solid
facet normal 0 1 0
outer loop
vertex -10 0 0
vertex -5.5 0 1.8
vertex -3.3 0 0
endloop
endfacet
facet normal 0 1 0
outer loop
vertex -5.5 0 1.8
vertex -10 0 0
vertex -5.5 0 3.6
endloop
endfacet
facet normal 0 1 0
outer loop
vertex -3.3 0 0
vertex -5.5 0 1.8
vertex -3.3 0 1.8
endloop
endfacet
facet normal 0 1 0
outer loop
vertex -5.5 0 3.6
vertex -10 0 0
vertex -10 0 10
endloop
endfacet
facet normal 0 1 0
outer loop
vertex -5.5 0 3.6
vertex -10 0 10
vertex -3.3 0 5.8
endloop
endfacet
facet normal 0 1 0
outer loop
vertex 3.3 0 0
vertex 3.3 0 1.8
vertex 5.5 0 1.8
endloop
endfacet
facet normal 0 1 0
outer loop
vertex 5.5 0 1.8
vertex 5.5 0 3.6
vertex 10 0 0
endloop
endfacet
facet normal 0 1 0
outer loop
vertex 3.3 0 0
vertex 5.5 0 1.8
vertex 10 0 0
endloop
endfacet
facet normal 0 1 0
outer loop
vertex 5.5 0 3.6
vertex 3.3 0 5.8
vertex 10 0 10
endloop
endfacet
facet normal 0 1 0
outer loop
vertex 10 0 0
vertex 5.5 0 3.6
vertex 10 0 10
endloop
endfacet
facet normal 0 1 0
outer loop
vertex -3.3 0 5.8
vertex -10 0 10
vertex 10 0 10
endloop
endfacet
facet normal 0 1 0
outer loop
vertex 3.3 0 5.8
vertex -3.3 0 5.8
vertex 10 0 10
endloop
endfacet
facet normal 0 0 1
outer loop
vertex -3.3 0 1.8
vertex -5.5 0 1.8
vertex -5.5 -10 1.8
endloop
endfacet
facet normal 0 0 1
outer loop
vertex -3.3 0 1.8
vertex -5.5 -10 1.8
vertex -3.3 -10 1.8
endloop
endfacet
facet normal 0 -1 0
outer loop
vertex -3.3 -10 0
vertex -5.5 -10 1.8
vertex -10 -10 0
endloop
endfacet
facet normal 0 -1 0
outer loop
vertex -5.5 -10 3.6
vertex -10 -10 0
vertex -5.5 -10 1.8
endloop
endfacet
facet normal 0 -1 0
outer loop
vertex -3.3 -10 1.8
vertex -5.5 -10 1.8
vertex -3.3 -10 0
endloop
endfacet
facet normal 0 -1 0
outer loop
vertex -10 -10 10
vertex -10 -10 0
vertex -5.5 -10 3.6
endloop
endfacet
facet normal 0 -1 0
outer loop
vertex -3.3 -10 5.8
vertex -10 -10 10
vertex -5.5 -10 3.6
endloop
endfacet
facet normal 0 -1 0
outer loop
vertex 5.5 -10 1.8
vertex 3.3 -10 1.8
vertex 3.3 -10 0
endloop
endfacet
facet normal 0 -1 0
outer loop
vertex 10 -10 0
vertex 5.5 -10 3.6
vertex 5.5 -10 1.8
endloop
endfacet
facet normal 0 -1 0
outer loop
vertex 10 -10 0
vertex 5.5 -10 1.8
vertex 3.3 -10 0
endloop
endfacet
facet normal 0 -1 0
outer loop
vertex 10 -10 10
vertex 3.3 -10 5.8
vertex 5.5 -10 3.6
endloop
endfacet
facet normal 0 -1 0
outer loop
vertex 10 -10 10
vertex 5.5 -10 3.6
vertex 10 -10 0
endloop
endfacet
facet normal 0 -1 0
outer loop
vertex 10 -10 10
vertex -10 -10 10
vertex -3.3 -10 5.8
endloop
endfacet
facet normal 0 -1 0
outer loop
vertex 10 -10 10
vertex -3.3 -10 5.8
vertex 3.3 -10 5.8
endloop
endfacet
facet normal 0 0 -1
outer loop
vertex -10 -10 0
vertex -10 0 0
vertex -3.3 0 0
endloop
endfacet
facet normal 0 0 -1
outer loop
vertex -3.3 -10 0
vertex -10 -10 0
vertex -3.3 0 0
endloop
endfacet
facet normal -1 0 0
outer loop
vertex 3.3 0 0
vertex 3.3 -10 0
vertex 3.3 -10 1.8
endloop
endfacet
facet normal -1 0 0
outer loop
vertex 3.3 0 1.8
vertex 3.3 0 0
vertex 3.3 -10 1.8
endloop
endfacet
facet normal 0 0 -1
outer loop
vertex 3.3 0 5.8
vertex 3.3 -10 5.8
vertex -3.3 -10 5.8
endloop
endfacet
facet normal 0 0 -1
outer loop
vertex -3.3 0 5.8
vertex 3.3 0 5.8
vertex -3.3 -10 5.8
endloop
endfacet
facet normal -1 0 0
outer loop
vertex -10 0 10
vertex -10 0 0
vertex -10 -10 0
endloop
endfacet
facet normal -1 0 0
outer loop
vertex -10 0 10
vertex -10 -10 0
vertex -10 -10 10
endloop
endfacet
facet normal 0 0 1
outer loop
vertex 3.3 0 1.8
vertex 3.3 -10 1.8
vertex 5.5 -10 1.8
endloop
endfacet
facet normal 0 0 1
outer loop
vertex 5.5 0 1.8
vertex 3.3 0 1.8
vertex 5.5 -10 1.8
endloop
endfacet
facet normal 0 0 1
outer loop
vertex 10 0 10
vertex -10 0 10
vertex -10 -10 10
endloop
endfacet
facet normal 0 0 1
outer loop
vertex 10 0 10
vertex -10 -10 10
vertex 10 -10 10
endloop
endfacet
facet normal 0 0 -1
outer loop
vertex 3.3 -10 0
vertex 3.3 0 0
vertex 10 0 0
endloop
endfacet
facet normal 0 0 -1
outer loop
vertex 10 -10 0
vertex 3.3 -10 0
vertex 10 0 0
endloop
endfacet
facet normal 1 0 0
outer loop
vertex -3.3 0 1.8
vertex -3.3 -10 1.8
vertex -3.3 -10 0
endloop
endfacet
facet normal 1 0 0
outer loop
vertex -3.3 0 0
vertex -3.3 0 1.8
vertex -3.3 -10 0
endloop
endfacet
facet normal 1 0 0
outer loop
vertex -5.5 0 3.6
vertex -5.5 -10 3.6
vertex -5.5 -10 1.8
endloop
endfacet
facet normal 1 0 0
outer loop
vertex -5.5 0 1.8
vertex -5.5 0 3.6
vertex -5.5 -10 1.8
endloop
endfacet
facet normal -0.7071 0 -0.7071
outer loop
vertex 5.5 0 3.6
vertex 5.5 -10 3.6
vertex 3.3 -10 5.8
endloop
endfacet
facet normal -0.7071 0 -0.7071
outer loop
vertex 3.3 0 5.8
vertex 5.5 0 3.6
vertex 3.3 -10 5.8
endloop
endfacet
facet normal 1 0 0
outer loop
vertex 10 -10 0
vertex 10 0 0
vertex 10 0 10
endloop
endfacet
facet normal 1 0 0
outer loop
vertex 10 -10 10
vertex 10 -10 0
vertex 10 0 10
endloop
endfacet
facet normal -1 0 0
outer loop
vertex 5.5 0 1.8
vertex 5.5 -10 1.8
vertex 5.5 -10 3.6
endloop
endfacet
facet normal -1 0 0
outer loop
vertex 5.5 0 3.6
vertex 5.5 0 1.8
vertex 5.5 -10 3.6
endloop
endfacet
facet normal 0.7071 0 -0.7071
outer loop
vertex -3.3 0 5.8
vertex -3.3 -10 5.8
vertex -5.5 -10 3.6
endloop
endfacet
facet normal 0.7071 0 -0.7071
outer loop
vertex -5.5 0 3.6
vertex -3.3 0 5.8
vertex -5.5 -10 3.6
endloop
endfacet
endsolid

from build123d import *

# Parameters (mm, degrees)
SKETCH_W     = 20
SKETCH_H     = 10
PAD_DEPTH    = 10
POCKET_DEPTH = 10.001


with BuildPart() as part:
    # Sketch → Pad (new body)
    with BuildSketch(Plane.XZ):
        with Locations((0, 5)):
            Rectangle(SKETCH_W, SKETCH_H)
    extrude(amount=PAD_DEPTH)

    # Sketch001 (on Face6 of Pad) → Pocket (cut, through all)
    with BuildSketch(Plane.XZ.offset(10)):
        Polygon((-3.3, 0), (3.3, 0), (3.3, 1.8), (5.5, 1.8), (5.5, 3.6), (3.3, 5.8), (-3.3, 5.8), (-5.5, 3.6), (-5.5, 1.8), (-3.3, 1.8), align=None)
    extrude(amount=-POCKET_DEPTH, mode=Mode.SUBTRACT)


solid = part.part
